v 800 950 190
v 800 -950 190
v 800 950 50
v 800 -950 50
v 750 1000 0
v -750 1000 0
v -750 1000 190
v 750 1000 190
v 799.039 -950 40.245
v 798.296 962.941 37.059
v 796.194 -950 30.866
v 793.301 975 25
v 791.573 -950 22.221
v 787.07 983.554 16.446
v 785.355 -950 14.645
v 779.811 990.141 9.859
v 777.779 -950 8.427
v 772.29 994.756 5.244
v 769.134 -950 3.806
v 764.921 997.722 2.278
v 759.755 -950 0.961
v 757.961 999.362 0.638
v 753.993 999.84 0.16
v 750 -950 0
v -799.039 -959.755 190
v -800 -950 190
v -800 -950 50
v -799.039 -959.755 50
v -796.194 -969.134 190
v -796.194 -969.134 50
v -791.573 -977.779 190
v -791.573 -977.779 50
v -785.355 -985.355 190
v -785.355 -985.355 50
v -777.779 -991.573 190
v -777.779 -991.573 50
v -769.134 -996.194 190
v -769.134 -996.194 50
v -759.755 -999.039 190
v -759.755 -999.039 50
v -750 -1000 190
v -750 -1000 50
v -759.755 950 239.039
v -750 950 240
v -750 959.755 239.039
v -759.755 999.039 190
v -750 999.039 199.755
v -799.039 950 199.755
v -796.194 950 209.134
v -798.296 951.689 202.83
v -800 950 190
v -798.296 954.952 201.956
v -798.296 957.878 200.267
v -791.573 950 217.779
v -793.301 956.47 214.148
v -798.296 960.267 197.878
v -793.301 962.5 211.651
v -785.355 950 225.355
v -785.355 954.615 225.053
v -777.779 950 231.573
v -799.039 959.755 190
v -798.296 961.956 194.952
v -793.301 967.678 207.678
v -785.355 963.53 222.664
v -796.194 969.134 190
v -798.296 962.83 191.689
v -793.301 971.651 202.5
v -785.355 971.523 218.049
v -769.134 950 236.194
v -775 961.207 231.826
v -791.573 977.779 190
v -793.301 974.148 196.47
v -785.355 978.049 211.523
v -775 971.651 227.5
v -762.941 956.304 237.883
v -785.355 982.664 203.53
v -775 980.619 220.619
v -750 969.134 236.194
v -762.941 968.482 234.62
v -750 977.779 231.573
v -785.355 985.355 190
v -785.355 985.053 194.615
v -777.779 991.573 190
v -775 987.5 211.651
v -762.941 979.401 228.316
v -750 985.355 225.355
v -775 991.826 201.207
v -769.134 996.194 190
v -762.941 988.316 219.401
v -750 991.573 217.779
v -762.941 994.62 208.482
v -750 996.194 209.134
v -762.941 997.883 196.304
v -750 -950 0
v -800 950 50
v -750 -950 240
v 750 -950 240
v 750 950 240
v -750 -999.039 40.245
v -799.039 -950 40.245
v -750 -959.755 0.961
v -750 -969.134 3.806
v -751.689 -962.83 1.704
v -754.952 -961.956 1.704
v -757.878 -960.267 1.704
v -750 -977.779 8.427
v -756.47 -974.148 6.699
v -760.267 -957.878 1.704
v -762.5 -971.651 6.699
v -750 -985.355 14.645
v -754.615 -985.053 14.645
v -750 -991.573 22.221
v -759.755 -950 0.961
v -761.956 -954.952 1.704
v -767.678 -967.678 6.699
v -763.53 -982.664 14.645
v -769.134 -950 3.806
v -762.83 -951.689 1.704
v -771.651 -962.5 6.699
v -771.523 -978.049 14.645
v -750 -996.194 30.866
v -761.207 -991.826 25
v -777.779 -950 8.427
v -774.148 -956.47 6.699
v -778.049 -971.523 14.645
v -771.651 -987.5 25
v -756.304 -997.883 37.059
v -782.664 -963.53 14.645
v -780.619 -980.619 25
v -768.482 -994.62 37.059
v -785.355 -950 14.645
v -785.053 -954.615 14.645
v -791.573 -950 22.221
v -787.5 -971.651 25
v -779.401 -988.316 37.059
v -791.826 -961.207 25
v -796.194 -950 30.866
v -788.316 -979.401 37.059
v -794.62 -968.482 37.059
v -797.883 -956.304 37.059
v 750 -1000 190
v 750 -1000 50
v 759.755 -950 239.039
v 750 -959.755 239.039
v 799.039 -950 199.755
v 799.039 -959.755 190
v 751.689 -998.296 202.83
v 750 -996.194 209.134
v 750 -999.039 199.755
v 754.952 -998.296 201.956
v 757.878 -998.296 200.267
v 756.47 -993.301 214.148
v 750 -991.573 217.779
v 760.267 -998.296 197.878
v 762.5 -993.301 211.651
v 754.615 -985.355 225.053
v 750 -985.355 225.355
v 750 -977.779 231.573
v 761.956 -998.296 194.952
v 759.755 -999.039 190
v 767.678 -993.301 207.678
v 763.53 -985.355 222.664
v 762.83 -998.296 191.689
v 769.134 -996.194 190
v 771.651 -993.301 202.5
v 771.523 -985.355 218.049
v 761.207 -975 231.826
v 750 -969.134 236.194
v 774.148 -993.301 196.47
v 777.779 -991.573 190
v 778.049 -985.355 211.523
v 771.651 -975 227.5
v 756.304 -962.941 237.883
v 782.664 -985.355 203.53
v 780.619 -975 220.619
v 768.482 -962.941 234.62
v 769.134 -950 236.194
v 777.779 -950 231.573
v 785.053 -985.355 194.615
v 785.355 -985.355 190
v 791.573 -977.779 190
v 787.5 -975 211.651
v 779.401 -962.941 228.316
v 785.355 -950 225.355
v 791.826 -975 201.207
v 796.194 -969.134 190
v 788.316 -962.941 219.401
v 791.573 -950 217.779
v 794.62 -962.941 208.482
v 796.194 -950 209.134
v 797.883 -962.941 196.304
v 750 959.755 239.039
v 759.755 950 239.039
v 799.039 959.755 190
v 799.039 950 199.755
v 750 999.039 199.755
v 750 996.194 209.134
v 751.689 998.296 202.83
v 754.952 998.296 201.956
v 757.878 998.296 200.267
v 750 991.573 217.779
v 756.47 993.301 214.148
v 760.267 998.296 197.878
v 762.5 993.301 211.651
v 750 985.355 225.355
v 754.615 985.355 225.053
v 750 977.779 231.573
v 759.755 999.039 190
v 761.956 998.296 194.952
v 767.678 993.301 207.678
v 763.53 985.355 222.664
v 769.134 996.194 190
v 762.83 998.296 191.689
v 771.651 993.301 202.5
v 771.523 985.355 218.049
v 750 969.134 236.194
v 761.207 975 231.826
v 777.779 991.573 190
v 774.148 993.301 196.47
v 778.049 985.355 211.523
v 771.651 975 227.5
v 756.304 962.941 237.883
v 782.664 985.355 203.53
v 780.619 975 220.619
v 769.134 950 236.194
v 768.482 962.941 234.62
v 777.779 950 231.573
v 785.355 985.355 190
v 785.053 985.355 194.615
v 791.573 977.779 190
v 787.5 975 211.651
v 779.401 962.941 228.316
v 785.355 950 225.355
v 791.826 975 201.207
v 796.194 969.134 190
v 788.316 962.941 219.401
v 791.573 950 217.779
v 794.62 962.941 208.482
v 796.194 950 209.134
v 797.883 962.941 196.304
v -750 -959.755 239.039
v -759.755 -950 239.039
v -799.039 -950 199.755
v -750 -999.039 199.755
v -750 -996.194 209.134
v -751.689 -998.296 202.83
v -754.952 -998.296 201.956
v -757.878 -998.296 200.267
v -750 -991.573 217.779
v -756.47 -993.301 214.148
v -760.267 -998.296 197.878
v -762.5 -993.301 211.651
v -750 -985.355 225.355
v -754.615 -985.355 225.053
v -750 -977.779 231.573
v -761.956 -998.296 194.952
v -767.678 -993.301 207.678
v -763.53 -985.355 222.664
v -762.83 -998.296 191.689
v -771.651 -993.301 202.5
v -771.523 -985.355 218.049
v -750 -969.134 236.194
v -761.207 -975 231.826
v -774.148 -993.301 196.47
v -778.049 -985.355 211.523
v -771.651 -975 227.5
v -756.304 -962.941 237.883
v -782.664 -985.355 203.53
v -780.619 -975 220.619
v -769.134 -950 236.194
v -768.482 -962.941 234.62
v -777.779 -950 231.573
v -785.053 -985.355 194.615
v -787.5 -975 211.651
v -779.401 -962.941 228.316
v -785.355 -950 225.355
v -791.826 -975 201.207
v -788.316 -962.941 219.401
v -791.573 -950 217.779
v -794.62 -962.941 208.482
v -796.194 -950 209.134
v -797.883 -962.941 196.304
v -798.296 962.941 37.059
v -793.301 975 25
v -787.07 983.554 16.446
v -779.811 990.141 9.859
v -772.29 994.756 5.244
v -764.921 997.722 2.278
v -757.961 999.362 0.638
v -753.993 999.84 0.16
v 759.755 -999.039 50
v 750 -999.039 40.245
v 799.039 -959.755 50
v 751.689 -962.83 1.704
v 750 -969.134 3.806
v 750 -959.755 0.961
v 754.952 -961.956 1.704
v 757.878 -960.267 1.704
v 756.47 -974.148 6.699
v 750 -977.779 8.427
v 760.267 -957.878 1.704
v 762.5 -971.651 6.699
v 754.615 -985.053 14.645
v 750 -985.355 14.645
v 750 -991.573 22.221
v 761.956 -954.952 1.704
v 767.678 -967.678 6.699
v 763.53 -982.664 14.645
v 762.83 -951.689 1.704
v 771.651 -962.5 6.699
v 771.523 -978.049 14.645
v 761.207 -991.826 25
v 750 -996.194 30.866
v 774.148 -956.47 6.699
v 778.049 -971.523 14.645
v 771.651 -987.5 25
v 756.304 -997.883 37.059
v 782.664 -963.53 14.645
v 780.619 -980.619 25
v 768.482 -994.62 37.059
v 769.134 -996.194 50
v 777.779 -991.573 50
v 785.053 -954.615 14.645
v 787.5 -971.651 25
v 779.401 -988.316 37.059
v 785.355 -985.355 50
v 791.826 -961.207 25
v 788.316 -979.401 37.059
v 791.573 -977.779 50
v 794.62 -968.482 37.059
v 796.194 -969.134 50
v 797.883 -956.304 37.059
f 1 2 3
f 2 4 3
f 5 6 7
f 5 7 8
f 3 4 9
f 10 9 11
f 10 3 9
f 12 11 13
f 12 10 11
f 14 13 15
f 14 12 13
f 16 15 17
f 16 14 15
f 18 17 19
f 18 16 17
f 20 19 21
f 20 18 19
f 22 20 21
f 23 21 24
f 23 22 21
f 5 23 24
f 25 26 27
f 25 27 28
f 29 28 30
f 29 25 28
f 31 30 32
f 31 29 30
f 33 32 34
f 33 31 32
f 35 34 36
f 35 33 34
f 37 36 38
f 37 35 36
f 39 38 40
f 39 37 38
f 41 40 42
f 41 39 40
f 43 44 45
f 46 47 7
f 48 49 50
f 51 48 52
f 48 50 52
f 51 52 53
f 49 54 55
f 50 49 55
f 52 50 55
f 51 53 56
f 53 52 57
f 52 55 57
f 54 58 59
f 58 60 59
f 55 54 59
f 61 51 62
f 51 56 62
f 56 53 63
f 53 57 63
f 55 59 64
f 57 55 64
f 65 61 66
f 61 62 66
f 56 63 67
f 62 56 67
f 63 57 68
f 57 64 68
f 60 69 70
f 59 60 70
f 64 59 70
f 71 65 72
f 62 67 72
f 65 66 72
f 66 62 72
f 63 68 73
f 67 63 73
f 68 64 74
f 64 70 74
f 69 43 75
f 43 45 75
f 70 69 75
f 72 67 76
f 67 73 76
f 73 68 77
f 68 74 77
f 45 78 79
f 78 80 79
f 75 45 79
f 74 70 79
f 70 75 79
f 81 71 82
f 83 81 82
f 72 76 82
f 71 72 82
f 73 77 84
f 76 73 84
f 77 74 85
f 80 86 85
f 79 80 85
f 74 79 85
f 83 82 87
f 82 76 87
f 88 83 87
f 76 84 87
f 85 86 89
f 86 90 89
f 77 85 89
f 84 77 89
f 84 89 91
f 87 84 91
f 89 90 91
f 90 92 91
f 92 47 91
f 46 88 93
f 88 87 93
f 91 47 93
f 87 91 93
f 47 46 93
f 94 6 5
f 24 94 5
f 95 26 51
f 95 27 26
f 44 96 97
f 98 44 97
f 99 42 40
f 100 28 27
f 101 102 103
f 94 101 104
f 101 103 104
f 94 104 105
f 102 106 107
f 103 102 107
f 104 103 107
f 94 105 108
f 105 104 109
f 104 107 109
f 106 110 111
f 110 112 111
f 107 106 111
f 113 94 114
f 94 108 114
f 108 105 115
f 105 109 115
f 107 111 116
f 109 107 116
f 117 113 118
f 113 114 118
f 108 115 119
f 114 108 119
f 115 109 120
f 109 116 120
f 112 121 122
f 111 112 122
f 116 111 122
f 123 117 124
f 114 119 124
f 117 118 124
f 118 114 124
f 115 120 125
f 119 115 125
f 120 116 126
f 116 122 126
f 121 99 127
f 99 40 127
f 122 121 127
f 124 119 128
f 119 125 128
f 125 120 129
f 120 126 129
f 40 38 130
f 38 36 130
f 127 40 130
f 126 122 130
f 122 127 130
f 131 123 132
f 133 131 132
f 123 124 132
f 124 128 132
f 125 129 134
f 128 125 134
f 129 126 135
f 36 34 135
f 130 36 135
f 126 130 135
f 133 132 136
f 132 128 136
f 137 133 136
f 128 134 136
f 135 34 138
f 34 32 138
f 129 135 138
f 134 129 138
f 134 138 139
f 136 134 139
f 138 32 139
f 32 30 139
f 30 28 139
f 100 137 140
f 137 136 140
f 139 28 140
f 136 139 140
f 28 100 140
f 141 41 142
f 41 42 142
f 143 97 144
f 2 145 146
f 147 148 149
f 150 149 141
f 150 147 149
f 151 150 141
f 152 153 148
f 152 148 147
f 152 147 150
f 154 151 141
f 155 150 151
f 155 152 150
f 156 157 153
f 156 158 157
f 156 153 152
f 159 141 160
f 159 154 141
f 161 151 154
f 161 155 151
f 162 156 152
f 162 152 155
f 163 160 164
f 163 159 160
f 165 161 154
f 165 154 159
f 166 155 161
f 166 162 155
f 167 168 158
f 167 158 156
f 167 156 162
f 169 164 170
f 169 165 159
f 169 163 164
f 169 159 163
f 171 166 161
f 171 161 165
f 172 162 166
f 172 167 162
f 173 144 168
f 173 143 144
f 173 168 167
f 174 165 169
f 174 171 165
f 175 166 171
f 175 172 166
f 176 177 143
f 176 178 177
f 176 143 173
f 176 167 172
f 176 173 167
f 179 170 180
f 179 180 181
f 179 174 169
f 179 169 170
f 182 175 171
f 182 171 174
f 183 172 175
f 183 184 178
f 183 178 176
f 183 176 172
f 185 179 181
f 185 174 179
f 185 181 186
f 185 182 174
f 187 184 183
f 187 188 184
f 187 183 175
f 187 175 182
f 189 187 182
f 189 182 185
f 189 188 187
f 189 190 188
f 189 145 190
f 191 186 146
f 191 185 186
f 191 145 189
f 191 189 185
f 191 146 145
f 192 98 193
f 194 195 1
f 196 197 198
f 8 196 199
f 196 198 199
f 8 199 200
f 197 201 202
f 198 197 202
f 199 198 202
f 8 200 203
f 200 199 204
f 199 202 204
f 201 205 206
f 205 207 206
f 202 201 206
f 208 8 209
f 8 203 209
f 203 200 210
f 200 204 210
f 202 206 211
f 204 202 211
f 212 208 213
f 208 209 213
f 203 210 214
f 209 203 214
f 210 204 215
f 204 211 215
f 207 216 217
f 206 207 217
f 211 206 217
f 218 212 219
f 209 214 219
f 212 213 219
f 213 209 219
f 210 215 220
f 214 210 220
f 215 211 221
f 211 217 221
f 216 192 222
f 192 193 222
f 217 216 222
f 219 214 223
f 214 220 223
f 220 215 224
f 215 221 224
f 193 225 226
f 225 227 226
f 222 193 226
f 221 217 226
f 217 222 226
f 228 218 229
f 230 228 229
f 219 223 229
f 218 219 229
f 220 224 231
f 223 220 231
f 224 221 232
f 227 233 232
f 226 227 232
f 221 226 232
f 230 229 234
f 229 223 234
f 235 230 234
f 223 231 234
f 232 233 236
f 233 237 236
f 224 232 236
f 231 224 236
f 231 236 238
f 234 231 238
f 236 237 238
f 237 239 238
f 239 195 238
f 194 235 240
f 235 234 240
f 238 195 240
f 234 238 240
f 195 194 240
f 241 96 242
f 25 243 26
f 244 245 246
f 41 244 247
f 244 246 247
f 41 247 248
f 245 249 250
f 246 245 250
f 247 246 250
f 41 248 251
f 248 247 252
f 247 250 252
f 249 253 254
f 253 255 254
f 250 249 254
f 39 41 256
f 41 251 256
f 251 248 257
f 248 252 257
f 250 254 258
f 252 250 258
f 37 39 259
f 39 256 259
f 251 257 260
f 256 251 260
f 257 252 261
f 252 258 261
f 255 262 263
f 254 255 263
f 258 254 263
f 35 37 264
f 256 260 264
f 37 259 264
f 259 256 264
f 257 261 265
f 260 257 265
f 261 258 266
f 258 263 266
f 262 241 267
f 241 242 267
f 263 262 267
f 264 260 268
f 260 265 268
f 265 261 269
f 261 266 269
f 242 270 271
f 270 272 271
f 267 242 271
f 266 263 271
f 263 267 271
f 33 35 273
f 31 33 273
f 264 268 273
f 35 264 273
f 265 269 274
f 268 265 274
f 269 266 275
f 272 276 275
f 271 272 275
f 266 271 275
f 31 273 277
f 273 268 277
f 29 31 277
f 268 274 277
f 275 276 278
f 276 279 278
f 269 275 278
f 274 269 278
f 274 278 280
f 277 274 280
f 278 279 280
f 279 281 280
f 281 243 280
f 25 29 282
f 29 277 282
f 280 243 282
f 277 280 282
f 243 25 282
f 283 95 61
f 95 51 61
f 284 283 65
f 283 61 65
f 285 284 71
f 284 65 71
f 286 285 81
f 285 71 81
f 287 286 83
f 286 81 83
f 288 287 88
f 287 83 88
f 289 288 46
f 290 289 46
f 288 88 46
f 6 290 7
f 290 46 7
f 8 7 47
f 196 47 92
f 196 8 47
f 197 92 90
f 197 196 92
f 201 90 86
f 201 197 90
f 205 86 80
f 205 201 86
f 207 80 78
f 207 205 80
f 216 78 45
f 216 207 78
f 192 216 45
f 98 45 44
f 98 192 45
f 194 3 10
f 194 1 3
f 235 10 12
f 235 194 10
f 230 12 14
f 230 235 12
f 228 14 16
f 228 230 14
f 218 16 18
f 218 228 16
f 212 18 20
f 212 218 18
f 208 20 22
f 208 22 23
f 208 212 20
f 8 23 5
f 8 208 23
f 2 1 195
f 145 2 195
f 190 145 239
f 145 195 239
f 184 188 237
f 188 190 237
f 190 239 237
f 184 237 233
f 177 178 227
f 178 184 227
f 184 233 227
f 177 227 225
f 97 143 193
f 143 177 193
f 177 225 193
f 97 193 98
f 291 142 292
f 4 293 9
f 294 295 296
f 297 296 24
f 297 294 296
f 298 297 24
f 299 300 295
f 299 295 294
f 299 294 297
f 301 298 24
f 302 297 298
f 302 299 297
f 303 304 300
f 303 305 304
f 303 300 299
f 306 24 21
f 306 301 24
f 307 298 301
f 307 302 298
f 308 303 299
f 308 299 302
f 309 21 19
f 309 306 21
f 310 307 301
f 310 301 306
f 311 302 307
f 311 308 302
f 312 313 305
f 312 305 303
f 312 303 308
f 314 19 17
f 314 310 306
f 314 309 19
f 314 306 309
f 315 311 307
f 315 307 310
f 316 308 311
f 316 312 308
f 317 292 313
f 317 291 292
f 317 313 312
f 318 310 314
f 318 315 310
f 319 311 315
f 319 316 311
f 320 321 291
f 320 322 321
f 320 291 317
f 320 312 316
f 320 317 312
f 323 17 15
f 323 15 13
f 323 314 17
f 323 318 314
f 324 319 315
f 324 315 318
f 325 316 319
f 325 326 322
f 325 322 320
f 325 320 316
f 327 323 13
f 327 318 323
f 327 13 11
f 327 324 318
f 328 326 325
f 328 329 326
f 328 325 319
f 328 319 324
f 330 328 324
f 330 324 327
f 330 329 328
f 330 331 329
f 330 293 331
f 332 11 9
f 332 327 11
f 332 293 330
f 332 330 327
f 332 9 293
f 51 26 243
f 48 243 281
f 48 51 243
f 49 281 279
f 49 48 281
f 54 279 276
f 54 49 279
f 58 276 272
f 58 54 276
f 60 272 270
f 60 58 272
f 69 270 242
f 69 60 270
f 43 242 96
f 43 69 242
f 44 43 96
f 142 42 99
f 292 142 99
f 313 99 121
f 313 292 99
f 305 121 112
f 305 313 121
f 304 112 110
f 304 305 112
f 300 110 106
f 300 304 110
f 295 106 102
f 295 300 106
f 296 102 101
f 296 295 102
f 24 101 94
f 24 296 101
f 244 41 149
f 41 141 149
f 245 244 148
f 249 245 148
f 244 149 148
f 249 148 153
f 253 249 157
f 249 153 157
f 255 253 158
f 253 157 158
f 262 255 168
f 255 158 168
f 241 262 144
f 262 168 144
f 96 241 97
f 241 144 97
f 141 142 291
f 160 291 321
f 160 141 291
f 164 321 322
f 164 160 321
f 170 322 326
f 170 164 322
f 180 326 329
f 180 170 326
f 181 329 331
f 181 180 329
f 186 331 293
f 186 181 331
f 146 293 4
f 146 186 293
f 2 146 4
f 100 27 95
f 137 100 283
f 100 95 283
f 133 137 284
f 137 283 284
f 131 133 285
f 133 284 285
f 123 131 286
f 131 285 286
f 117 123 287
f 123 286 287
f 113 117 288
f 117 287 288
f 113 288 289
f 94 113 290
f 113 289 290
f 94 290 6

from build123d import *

# Parameters (mm, degrees)
F0_W     = 1600
F0_H     = 2000
F1_DEPTH = 240
F2_R     = 50


with BuildPart() as f1:
    # F0 (on Top) → F1 (new body)
    with BuildSketch(Plane.XY):
        Rectangle(F0_W, F0_H)
    extrude(amount=F1_DEPTH)

    # F2
    f2_edges = [f1.edges().sort_by_distance(p)[0] for p in [
        (800, 0, 240),
        (0, 1000, 240),
        (-800, 0, 240),
        (0, -1000, 240),
        (800, -1000, 120),
        (800, 1000, 120),
        (-800, -1000, 120),
        (-800, 1000, 120),
        (0, -1000, 0),
        (-800, 0, 0),
        (800, 0, 0),
    ]]
    fillet(f2_edges, radius=F2_R)


solid = f1.part
